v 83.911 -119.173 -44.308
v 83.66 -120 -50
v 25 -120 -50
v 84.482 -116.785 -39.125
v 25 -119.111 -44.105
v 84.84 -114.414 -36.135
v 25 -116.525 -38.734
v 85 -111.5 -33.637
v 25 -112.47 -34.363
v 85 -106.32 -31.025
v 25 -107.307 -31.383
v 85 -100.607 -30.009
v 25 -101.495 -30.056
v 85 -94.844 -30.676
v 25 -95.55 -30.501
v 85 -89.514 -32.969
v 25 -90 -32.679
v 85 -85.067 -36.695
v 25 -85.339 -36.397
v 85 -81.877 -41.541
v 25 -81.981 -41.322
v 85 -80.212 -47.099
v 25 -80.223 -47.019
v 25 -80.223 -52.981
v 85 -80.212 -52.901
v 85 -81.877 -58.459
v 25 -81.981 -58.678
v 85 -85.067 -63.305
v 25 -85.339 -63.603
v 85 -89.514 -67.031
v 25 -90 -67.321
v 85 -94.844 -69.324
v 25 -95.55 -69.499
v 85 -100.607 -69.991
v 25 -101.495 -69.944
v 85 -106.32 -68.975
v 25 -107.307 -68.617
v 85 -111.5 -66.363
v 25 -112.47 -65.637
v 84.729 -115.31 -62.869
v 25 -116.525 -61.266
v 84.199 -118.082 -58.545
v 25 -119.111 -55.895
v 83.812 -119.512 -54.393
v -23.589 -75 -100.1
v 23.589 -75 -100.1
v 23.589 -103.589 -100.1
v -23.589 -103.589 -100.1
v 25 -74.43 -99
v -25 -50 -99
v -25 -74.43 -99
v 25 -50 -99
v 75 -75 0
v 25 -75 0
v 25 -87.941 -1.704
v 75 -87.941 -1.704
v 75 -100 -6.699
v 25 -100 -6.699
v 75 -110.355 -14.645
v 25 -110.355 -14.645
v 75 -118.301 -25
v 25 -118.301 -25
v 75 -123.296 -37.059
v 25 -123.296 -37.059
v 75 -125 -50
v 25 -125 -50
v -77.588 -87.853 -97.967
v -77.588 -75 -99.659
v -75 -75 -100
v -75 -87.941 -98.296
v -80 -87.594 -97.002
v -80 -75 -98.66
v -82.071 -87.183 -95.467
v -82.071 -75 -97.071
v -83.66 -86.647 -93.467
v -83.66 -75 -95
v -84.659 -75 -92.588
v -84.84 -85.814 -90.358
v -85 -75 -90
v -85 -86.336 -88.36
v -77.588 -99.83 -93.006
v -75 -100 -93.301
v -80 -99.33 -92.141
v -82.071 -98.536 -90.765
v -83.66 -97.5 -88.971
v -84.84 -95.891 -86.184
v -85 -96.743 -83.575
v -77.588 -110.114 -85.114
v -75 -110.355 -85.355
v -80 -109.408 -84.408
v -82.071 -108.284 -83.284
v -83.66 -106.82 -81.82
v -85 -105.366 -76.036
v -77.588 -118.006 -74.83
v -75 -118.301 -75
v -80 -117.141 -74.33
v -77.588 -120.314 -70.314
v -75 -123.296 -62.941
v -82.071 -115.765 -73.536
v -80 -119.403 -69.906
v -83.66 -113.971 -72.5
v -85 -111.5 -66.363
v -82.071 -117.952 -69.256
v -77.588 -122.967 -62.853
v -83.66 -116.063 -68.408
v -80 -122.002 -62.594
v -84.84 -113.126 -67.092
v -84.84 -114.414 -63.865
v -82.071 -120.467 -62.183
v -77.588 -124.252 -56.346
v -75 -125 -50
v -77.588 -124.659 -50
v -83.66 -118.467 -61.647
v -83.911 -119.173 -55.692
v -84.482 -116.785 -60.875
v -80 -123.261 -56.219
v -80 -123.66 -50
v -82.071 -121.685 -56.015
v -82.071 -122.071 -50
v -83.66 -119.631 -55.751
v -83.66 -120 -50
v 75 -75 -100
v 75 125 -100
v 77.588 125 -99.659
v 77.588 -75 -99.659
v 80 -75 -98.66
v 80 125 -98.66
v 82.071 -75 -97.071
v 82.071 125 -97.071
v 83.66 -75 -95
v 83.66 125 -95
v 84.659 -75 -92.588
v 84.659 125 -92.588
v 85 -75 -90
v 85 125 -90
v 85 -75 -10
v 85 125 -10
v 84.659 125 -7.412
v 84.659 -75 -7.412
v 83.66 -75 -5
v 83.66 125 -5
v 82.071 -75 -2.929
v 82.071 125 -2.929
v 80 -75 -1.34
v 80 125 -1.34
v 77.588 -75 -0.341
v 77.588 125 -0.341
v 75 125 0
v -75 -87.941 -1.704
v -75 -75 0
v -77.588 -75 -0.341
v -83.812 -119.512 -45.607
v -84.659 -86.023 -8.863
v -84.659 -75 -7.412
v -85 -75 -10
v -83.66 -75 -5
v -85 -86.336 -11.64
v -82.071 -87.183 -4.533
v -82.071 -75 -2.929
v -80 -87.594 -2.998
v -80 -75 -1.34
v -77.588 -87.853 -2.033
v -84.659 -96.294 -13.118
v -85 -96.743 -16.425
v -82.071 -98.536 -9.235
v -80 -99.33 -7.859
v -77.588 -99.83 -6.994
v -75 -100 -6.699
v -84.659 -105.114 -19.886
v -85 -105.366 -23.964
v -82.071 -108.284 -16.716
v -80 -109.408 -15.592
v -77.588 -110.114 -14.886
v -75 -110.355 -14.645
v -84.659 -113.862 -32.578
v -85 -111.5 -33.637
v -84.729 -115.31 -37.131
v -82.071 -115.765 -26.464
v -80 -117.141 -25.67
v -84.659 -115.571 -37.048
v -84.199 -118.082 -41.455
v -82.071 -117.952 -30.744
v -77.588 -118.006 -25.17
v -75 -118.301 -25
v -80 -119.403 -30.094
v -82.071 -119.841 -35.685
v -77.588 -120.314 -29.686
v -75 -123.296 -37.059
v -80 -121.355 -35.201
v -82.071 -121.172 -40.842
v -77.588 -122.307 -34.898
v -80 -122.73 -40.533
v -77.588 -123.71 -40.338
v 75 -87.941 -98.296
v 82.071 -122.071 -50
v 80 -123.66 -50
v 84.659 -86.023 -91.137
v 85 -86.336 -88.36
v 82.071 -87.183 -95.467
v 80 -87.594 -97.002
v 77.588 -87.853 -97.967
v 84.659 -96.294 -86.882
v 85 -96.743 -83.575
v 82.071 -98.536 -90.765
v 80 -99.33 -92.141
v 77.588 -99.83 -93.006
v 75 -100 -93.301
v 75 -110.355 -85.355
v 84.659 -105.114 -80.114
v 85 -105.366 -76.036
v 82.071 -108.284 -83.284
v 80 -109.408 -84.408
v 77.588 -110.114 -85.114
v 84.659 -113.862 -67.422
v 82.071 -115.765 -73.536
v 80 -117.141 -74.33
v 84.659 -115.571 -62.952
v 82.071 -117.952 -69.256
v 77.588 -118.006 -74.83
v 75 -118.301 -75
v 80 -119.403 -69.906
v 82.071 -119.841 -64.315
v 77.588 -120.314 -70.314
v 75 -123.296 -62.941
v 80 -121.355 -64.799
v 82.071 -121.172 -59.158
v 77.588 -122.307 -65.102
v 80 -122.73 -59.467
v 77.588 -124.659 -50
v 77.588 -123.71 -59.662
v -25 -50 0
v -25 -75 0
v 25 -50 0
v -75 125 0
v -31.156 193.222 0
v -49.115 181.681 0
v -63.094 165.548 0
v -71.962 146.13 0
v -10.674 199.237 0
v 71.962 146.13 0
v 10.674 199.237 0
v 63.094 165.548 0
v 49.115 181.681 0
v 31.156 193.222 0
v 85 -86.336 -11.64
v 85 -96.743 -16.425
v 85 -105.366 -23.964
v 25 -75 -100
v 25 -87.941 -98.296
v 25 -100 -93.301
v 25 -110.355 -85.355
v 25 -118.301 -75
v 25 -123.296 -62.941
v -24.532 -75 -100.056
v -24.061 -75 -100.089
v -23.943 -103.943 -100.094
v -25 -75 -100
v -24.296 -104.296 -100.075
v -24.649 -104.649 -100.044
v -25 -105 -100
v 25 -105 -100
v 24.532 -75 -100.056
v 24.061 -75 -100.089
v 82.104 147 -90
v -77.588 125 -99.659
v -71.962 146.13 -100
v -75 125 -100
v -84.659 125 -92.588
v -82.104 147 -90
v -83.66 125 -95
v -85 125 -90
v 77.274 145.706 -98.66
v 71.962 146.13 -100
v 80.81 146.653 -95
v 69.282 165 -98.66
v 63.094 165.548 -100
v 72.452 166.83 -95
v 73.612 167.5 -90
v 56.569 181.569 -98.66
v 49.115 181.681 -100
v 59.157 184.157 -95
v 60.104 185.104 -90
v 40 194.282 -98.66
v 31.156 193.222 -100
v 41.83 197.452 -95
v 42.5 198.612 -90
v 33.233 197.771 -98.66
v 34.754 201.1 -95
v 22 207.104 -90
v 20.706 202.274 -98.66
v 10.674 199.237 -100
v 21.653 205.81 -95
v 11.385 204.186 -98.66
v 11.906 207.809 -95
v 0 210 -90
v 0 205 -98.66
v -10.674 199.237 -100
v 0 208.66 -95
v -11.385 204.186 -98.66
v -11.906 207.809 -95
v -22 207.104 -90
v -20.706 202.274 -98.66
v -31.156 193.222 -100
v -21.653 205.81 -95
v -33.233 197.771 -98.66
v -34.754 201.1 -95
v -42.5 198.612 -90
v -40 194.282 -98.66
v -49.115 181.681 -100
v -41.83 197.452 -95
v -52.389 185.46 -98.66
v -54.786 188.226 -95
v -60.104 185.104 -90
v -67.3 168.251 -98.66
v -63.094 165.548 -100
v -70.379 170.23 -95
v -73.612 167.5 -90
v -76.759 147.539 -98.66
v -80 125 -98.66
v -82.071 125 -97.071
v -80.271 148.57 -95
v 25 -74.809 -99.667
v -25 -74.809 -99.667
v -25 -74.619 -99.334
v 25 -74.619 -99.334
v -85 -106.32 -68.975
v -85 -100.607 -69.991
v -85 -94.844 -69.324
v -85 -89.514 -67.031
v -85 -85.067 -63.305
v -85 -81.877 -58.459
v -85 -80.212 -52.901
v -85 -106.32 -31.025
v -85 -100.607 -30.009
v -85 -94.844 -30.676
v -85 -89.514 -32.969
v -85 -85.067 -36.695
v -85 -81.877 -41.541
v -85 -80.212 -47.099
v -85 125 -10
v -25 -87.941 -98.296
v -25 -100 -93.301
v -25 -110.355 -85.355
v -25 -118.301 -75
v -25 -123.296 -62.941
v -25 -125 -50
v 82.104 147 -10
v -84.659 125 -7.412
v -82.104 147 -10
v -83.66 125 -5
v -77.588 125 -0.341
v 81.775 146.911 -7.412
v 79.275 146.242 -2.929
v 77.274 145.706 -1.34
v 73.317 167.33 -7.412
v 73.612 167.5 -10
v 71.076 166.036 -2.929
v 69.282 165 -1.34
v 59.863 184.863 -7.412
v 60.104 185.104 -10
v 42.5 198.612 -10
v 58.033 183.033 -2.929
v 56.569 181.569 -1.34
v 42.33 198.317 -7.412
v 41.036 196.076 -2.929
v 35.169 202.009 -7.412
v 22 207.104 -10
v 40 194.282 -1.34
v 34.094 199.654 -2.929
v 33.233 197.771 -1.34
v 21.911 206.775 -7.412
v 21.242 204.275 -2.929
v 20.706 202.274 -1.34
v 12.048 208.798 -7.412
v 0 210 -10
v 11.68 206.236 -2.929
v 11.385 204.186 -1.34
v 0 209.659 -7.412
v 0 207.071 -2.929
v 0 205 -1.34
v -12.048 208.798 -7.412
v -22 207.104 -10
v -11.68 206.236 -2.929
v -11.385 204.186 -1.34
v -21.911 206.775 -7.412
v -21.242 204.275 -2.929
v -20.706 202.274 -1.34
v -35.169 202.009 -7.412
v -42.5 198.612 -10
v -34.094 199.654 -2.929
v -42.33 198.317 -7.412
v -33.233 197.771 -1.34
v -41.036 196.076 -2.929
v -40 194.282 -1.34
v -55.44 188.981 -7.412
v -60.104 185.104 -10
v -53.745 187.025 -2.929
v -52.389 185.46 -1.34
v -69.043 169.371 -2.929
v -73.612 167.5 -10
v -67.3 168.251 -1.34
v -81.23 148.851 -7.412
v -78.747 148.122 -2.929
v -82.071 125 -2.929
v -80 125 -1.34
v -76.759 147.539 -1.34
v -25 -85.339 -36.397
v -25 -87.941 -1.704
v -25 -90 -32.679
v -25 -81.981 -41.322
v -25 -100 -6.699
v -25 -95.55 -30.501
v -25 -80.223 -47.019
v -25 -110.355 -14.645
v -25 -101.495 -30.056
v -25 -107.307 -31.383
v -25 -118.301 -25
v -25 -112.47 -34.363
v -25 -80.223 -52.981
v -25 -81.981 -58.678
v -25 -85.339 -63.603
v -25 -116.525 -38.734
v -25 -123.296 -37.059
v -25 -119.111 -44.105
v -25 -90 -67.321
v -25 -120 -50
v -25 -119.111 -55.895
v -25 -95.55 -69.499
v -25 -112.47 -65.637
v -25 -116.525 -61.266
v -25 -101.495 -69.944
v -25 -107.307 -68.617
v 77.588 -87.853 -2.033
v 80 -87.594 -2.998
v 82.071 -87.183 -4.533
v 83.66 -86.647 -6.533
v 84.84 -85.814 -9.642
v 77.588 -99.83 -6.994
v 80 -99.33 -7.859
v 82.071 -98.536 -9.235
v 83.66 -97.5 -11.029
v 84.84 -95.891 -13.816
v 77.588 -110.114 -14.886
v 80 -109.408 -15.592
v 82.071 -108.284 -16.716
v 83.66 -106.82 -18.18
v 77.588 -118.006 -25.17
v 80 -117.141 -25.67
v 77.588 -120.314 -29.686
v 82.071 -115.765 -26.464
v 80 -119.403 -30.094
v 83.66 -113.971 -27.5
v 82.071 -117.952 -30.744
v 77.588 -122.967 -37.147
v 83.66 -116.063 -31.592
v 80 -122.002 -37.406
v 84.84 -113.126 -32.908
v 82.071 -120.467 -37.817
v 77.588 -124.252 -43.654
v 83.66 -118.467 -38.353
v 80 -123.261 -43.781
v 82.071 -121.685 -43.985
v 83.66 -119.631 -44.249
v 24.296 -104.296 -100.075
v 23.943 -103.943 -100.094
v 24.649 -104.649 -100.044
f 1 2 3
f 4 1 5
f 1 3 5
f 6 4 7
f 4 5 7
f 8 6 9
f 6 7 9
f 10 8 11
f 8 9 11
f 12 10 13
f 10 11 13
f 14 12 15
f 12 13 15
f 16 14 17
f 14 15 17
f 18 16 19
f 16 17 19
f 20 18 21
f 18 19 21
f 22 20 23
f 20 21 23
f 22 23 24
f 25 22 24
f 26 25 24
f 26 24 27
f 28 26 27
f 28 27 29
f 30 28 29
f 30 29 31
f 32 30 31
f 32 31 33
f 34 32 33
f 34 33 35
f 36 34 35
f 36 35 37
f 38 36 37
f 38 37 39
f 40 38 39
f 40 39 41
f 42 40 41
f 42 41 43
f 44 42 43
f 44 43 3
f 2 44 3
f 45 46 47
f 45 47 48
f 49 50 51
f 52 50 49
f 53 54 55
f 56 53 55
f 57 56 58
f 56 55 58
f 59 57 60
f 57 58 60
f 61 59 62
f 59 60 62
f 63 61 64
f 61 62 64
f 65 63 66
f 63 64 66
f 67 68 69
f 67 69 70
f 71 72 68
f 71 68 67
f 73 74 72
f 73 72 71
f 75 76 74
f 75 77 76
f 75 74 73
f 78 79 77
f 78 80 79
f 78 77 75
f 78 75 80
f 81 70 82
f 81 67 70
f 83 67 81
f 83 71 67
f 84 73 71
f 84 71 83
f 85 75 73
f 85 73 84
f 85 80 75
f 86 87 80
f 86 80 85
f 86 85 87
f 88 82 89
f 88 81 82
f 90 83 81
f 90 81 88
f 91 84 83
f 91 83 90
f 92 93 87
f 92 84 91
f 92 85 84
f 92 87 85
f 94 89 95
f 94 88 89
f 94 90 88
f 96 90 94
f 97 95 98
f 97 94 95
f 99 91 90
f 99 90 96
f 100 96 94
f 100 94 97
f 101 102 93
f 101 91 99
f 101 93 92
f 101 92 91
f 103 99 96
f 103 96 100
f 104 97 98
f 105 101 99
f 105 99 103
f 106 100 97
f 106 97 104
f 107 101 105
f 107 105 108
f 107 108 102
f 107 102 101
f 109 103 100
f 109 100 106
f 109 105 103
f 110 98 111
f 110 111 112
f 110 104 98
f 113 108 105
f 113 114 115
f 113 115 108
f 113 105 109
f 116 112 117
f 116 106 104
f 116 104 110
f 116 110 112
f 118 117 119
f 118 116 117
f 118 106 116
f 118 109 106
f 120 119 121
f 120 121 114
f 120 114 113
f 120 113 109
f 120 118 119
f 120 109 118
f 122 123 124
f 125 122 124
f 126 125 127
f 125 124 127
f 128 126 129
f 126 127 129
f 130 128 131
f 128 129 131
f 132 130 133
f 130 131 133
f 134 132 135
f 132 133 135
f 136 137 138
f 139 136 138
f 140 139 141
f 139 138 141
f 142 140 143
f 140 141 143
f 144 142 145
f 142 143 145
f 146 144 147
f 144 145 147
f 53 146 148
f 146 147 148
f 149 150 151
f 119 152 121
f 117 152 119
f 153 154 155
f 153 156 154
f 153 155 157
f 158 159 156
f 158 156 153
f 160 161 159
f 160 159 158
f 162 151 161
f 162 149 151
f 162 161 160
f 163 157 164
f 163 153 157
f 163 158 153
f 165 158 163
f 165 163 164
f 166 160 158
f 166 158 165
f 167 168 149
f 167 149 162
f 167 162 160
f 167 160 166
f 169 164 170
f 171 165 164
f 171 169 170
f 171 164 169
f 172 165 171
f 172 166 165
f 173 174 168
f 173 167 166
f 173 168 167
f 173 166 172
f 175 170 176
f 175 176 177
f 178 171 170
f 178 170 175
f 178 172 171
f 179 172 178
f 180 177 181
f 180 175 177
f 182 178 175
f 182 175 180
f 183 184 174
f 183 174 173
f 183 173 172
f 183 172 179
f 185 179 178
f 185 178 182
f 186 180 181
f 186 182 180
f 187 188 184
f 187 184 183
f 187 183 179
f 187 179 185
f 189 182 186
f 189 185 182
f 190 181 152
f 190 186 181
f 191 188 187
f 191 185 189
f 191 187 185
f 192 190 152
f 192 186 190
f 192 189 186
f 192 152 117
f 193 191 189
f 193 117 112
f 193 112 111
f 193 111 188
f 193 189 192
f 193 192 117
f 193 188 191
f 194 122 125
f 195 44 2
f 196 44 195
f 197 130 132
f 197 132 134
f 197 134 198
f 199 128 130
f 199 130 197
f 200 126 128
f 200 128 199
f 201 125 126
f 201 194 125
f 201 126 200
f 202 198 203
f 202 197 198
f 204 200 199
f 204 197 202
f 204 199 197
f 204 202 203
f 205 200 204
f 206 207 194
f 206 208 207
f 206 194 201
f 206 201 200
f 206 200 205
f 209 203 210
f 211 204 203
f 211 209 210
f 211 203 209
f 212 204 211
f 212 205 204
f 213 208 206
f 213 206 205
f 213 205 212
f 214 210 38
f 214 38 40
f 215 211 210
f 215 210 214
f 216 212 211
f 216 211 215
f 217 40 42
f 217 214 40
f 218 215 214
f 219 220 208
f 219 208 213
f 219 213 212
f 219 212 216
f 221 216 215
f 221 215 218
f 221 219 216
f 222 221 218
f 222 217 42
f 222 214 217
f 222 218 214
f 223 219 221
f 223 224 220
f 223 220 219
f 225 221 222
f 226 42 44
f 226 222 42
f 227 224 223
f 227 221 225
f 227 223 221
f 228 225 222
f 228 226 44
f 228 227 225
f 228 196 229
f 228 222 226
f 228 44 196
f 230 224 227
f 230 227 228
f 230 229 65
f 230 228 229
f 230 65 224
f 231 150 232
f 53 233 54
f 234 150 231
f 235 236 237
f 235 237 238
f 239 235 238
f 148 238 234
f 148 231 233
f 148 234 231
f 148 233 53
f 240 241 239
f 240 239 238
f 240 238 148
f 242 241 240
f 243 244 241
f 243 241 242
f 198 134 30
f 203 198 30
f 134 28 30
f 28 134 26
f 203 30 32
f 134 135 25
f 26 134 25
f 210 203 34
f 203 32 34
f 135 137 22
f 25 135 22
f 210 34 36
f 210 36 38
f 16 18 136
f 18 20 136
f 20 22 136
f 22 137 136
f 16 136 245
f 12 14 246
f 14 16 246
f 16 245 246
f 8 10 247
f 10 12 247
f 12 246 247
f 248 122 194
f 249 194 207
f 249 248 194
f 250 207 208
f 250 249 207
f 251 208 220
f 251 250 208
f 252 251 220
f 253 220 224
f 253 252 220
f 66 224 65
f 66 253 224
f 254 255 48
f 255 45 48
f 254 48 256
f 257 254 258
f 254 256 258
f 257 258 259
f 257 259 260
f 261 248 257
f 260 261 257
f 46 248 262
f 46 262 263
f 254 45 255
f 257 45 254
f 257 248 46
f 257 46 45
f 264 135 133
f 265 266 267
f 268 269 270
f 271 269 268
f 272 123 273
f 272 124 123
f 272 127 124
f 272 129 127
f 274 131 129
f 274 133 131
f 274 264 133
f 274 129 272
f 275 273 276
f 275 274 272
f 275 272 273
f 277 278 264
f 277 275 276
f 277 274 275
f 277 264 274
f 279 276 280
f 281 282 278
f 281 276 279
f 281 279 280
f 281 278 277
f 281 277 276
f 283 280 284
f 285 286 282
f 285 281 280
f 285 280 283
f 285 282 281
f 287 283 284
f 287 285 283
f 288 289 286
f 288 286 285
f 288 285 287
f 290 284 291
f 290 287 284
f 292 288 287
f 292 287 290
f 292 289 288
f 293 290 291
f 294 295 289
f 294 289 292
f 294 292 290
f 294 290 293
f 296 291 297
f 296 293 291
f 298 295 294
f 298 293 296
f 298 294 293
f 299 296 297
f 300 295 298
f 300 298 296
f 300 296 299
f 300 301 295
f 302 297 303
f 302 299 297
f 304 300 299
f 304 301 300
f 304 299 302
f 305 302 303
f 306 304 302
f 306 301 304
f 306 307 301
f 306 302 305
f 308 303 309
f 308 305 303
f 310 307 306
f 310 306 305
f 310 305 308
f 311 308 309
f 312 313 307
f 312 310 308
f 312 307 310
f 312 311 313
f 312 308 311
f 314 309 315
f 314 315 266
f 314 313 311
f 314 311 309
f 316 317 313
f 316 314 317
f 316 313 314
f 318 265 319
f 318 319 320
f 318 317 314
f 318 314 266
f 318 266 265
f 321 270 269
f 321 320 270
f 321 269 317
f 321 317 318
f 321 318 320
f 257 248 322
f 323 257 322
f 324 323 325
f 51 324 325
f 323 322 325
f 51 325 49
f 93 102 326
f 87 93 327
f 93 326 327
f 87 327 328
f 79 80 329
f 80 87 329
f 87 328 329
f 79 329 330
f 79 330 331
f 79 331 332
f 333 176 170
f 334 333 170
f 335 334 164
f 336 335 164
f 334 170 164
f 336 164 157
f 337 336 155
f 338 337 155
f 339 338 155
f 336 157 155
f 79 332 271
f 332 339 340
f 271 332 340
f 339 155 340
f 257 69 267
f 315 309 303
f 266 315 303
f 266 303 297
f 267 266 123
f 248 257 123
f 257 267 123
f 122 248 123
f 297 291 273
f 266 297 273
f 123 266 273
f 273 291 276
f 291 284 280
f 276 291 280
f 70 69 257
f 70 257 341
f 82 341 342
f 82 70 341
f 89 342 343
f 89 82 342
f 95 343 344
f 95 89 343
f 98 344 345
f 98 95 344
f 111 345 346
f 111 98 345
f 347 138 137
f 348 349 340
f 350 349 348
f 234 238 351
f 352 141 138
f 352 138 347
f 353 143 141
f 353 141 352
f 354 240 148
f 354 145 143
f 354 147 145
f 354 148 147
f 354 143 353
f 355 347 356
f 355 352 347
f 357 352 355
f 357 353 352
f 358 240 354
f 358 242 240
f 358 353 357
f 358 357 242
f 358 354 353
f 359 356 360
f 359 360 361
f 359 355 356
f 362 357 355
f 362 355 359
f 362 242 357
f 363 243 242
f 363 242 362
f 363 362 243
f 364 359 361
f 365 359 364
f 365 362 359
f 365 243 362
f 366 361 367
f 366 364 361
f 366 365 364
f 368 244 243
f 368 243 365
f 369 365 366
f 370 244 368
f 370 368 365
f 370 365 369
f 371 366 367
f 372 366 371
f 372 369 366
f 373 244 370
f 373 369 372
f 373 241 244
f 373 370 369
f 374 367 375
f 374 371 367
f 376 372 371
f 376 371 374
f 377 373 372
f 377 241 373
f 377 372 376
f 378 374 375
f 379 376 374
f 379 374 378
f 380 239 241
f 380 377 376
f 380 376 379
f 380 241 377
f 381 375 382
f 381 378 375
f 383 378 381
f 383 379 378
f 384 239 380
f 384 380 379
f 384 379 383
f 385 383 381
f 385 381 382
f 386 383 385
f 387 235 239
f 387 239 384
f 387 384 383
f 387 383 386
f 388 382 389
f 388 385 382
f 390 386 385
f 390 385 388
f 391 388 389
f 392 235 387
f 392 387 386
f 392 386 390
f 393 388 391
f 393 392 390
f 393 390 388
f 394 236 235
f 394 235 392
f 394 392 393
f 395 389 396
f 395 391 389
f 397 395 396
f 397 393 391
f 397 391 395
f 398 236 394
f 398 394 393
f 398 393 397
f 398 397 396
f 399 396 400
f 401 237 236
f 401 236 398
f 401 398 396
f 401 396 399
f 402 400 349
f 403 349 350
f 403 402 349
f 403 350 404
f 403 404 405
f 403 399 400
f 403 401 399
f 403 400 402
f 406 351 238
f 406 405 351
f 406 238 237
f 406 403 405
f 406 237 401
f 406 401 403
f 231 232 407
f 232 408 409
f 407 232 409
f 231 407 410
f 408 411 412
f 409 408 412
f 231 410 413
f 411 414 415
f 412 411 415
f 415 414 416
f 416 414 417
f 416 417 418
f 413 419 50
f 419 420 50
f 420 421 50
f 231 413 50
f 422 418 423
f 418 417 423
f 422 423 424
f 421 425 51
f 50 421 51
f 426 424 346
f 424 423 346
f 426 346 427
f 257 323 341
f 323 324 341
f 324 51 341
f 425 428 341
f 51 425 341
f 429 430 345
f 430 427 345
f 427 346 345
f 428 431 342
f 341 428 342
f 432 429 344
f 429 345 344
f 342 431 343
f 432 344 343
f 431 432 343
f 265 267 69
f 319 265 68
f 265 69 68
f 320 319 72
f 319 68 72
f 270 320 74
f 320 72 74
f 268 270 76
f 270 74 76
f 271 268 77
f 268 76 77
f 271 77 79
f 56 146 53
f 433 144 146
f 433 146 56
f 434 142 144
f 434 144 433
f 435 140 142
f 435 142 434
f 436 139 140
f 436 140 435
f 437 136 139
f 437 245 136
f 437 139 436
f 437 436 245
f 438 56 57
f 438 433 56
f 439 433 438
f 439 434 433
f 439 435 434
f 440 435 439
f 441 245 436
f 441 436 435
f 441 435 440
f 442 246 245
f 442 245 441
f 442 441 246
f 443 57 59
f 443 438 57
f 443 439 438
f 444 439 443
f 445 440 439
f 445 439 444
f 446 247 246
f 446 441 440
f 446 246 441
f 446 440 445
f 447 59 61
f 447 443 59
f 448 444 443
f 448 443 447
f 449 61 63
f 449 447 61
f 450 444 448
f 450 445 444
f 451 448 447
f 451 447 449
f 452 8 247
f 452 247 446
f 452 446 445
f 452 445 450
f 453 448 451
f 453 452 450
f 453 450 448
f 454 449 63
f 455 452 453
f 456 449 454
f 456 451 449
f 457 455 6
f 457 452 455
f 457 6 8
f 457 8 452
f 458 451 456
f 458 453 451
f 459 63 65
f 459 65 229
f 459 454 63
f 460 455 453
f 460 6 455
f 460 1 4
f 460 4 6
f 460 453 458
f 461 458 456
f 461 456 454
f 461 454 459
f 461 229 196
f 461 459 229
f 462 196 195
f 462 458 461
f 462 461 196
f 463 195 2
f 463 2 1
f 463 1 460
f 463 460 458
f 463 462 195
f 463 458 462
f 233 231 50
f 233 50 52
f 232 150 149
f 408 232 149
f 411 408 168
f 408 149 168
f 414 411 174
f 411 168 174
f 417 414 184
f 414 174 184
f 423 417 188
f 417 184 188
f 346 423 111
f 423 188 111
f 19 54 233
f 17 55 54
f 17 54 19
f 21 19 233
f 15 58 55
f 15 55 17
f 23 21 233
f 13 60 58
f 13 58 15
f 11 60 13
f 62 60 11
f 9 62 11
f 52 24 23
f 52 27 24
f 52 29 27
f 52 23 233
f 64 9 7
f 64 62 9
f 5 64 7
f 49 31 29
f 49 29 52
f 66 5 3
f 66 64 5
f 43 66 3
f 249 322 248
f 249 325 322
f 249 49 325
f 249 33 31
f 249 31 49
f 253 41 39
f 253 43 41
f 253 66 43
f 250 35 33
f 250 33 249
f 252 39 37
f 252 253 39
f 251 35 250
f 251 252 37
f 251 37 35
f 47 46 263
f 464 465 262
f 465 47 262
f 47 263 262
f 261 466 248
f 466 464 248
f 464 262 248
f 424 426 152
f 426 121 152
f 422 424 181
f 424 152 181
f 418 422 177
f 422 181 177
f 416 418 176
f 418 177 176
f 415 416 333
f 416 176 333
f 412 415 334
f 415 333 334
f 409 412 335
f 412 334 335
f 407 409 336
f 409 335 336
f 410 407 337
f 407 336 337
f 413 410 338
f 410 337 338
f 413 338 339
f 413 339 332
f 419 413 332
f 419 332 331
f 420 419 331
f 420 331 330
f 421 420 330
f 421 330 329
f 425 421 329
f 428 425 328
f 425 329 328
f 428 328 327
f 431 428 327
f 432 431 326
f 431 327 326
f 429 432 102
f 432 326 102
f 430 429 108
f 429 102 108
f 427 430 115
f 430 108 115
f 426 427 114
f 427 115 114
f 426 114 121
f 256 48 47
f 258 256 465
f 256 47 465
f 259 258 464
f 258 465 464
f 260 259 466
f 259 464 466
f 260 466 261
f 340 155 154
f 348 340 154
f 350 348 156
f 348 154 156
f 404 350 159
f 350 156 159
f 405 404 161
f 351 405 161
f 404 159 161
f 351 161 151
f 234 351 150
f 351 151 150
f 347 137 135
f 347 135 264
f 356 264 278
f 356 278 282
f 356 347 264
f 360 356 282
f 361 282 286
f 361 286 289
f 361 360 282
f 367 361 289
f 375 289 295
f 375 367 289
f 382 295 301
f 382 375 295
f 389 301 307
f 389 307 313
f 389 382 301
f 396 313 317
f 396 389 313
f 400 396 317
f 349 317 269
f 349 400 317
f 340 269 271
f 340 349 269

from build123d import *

# Parameters (mm, degrees)
BOSS_EXTRUDE1_DEPTH    = 100
SKETCH2_W              = 50
SKETCH2_H              = 50
CUT_EXTRUDE1_DEPTH     = 182.245689604
CUT_EXTRUDE2_DEPTH     = 25
SKETCH7_R              = 20
CUT_EXTRUDE3_DEPTH     = 234.505888577
FILLET2_R              = 50
CUT_EXTRUDE6_START     = -125
CUT_EXTRUDE6_OUTLINE_W = 50
CUT_EXTRUDE6_OUTLINE_H = 6.698729811
CUT_EXTRUDE6_DEPTH     = 50
CUT_EXTRUDE7_DEPTH     = 25
BOSS_EXTRUDE2_DEPTH    = 100
FILLET4_R              = 10
SKETCH11_W             = 50
SKETCH11_H             = 25
CUT_EXTRUDE11_DEPTH    = 99
SKETCH16_W             = 50
SKETCH16_H             = 30
BOSS_EXTRUDE3_DEPTH    = 0.1
FILLET5_R              = 10


with BuildPart() as part:
    # Sketch1 → Boss-Extrude1 (new body)
    with BuildSketch(Plane.XY):
        Polygon((-85, 125), (10.2, 125), (59.8, 125), (85, 125), (85, -125), (-85, -125), align=None)
    extrude(amount=-BOSS_EXTRUDE1_DEPTH)

    # Sketch2 → Cut-Extrude1 (cut, through all)
    with BuildSketch(Plane.XY):
        with Locations((0, -125)):
            Rectangle(SKETCH2_W, SKETCH2_H)
    extrude(amount=-CUT_EXTRUDE1_DEPTH, mode=Mode.SUBTRACT)

    # Sketch6 → Cut-Extrude2 (cut, symmetric)
    with BuildSketch(Plane(origin=(0, 0, 0), x_dir=(0, 0, -1), z_dir=(1, 0, 0))):
        with BuildLine():
            Line((100, -100), (0, -100))
            ThreePointArc((0, -100), (50, -50), (100, -100))
        make_face()
    extrude(amount=CUT_EXTRUDE2_DEPTH, both=True, mode=Mode.SUBTRACT)

    # Sketch7 → Cut-Extrude3 (cut, through all)
    with BuildSketch(Plane.ZY.offset(85)):
        with Locations(Location((-50, -100, 0), (0, 0, 270))):
            Circle(SKETCH7_R)
    extrude(amount=-CUT_EXTRUDE3_DEPTH, mode=Mode.SUBTRACT)

    # Fillet2
    fillet2_edges = [part.edges().sort_by_distance(p)[0] for p in [
        (-55, -125, -100),
        (-55, -125, 0),
    ]]
    fillet(fillet2_edges, radius=FILLET2_R - 0.0001)  # a hair under: the kernel refuses the full size

    # Cut-Extrude6: read off the stored shape, not the designer's step
    # Cut-Extrude6 outline → Cut-Extrude6 (cut)
    with BuildSketch(Plane(origin=(0, 0, 0), x_dir=(1, 0, 0), z_dir=(0, 1, 0)).offset(CUT_EXTRUDE6_START)):
        with Locations((0, 96.650635095)):
            Rectangle(CUT_EXTRUDE6_OUTLINE_W, CUT_EXTRUDE6_OUTLINE_H)
        with Locations((0, 3.349364906)):
            Rectangle(CUT_EXTRUDE6_OUTLINE_W, CUT_EXTRUDE6_OUTLINE_H)
    extrude(amount=CUT_EXTRUDE6_DEPTH, mode=Mode.SUBTRACT)

    # Sketch10 → Cut-Extrude7 (cut, symmetric)
    with BuildSketch(Plane(origin=(0, 0, 0), x_dir=(0, 0, -1), z_dir=(1, 0, 0))):
        with BuildLine():
            Line((0, -75), (100, -75))
            ThreePointArc((100, -75), (50, -61.602540378), (0, -75))
        make_face()
    extrude(amount=CUT_EXTRUDE7_DEPTH, both=True, mode=Mode.SUBTRACT)

    # Sketch15 → Boss-Extrude2 (add)
    with BuildSketch(Plane.XY):
        with BuildLine():
            Line((-85, 125), (85, 125))
            ThreePointArc((85, 125), (0, 210), (-85, 125))
        make_face()
    extrude(amount=-BOSS_EXTRUDE2_DEPTH)

    # Fillet4
    # the kernel refuses this fillet: 10 mm, written as the material it takes off along each edge
    with BuildSketch(Plane(origin=(0, 125, -100), x_dir=(1, 0, 0), z_dir=(0, -1, 0))) as fillet4_piece_1:
        with BuildLine():
            CenterArc((85 - FILLET4_R, FILLET4_R), FILLET4_R, 270, 90)
            Line((85, FILLET4_R), (85, 0))
            Line((85, 0), (85 - FILLET4_R, 0))
        make_face()
    revolve(axis=Axis((0, 125, -100), (0, 0, 1)), revolution_arc=180, mode=Mode.SUBTRACT)
    with BuildSketch(Plane(origin=(0, 125, 0), x_dir=(1, 0, 0), z_dir=(0, -1, 0))) as fillet4_piece_2:
        with BuildLine():
            CenterArc((85 - FILLET4_R, -FILLET4_R), FILLET4_R, 0, 90)
            Line((85, -FILLET4_R), (85, 0))
            Line((85, 0), (85 - FILLET4_R, 0))
        make_face()
    revolve(axis=Axis((0, 125, 0), (0, 0, 1)), revolution_arc=180, mode=Mode.SUBTRACT)
    with BuildSketch(Plane(origin=(-85, -75.0001, -100), x_dir=(0, 0, 1), z_dir=(0, 1, 0)), Plane(origin=(85, 125, 0), x_dir=(-1, 0, 0), z_dir=(0, -1, 0))) as fillet4_piece_3:
        with BuildLine():
            CenterArc((FILLET4_R, FILLET4_R), FILLET4_R, 180, 90)
            Line((0, FILLET4_R), (0, 0))
            Line((0, 0), (FILLET4_R, 0))
        make_face()
    extrude(amount=200.0001, mode=Mode.SUBTRACT)
    with BuildSketch(Plane(origin=(85, 125, -100), x_dir=(-1, 0, 0), z_dir=(0, -1, 0)), Plane(origin=(-85, -75.0001, 0), x_dir=(0, 0, -1), z_dir=(0, 1, 0))) as fillet4_piece_4:
        with BuildLine():
            CenterArc((FILLET4_R, -FILLET4_R), FILLET4_R, 90, 90)
            Line((0, -FILLET4_R), (0, 0))
            Line((0, 0), (FILLET4_R, 0))
        make_face()
    extrude(amount=200.0001, mode=Mode.SUBTRACT)
    with BuildSketch(Plane(origin=(85, -75.0001, -49.9999), x_dir=(0, 0, 1), z_dir=(0, 1, 0))) as fillet4_piece_5:
        with BuildLine():
            CenterArc((49.9999 - FILLET4_R, -FILLET4_R), FILLET4_R, 0, 90)
            Line((49.9999 - FILLET4_R, 0), (49.9999, 0))
            Line((49.9999, 0), (49.9999, -FILLET4_R))
        make_face()
    revolve(axis=Axis((85, -75.0001, -49.9999), (1, 0, 0)), revolution_arc=90, mode=Mode.SUBTRACT)
    with BuildSketch(Plane(origin=(85, -75.0001, -50.0001), x_dir=(0, 0, -1), z_dir=(0, 1, 0))) as fillet4_piece_6:
        with BuildLine():
            CenterArc((49.9999 - FILLET4_R, FILLET4_R), FILLET4_R, 270, 90)
            Line((49.9999, FILLET4_R), (49.9999, 0))
            Line((49.9999, 0), (49.9999 - FILLET4_R, 0))
        make_face()
    revolve(axis=Axis((85, -75.0001, -50.0001), (-1, 0, 0)), revolution_arc=90, mode=Mode.SUBTRACT)
    with BuildSketch(Plane(origin=(-85, -75.0001, -49.9999), x_dir=(0, 0, 1), z_dir=(0, 1, 0))) as fillet4_piece_7:
        with BuildLine():
            CenterArc((49.9999 - FILLET4_R, FILLET4_R), FILLET4_R, 270, 90)
            Line((49.9999, FILLET4_R), (49.9999, 0))
            Line((49.9999, 0), (49.9999 - FILLET4_R, 0))
        make_face()
    revolve(axis=Axis((-85, -75.0001, -49.9999), (1, 0, 0)), revolution_arc=90, mode=Mode.SUBTRACT)
    with BuildSketch(Plane(origin=(-85, -75.0001, -50.0001), x_dir=(0, 0, -1), z_dir=(0, 1, 0))) as fillet4_piece_8:
        with BuildLine():
            CenterArc((49.9999 - FILLET4_R, -FILLET4_R), FILLET4_R, 0, 90)
            Line((49.9999, -FILLET4_R), (49.9999, 0))
            Line((49.9999, 0), (49.9999 - FILLET4_R, 0))
        make_face()
    revolve(axis=Axis((-85, -75.0001, -50.0001), (-1, 0, 0)), revolution_arc=90, mode=Mode.SUBTRACT)
    with BuildSketch(Plane(origin=(-85, -125, -49.9999), x_dir=(0, 1, 0), z_dir=(0, 0, -1))) as fillet4_piece_9:
        with BuildLine():
            CenterArc((FILLET4_R, FILLET4_R), FILLET4_R, 180, 90)
            Line((0, FILLET4_R), (0, 0))
            Line((0, 0), (FILLET4_R, 0))
        make_face()
    extrude(amount=0.0002, mode=Mode.SUBTRACT)
    with BuildSketch(Plane(origin=(85, -125, -49.9999), x_dir=(0, 1, 0), z_dir=(0, 0, -1))) as fillet4_piece_10:
        with BuildLine():
            CenterArc((FILLET4_R, -FILLET4_R), FILLET4_R, 90, 90)
            Line((0, -FILLET4_R), (0, 0))
            Line((0, 0), (FILLET4_R, 0))
        make_face()
    extrude(amount=0.0002, mode=Mode.SUBTRACT)

    # Sketch11 → Cut-Extrude11 (cut)
    with BuildSketch(Plane.XY):
        with Locations((0, -62.5)):
            Rectangle(SKETCH11_W, SKETCH11_H)
    extrude(amount=-CUT_EXTRUDE11_DEPTH, mode=Mode.SUBTRACT)


with BuildPart() as body_2:
    # Sketch16 → Boss-Extrude3 (new body)
    with BuildSketch(Plane(origin=(0, 0, -100), x_dir=(-1, 0, 0), z_dir=(0, 0, -1))):
        with Locations((0, -90)):
            Rectangle(SKETCH16_W, SKETCH16_H)
    extrude(amount=BOSS_EXTRUDE3_DEPTH)

    # Fillet5
    # the kernel refuses this fillet: 10 mm, written as the material it takes off along each edge
    with BuildSketch(Plane(origin=(25, -71.473316005, -100.1), x_dir=(0, 0, 1), z_dir=(0, -1, 0)), Plane(origin=(-25, -108.526683995, -100.1), x_dir=(0, 0, 1), z_dir=(0, 1, 0))) as fillet5_piece_1:
        with BuildLine():
            CenterArc((10, 1.410673598), FILLET5_R, 180, 8.109614456)
            Line((0, 1.410673598), (0, 0))
            Line((0, 0), (0.1, 0))
        make_face()
    extrude(amount=37.05336799, mode=Mode.SUBTRACT)
    with BuildSketch(Plane(origin=(28.526683995, -105, -100.1), x_dir=(0, 0, 1), z_dir=(-1, 0, 0))) as fillet5_piece_2:
        with BuildLine():
            CenterArc((10, 1.410673598), FILLET5_R, 180, 8.109614456)
            Line((0, 1.410673598), (0, 0))
            Line((0, 0), (0.1, 0))
        make_face()
    extrude(amount=57.05336799, mode=Mode.SUBTRACT)


solid = Compound([part.part, body_2.part])
